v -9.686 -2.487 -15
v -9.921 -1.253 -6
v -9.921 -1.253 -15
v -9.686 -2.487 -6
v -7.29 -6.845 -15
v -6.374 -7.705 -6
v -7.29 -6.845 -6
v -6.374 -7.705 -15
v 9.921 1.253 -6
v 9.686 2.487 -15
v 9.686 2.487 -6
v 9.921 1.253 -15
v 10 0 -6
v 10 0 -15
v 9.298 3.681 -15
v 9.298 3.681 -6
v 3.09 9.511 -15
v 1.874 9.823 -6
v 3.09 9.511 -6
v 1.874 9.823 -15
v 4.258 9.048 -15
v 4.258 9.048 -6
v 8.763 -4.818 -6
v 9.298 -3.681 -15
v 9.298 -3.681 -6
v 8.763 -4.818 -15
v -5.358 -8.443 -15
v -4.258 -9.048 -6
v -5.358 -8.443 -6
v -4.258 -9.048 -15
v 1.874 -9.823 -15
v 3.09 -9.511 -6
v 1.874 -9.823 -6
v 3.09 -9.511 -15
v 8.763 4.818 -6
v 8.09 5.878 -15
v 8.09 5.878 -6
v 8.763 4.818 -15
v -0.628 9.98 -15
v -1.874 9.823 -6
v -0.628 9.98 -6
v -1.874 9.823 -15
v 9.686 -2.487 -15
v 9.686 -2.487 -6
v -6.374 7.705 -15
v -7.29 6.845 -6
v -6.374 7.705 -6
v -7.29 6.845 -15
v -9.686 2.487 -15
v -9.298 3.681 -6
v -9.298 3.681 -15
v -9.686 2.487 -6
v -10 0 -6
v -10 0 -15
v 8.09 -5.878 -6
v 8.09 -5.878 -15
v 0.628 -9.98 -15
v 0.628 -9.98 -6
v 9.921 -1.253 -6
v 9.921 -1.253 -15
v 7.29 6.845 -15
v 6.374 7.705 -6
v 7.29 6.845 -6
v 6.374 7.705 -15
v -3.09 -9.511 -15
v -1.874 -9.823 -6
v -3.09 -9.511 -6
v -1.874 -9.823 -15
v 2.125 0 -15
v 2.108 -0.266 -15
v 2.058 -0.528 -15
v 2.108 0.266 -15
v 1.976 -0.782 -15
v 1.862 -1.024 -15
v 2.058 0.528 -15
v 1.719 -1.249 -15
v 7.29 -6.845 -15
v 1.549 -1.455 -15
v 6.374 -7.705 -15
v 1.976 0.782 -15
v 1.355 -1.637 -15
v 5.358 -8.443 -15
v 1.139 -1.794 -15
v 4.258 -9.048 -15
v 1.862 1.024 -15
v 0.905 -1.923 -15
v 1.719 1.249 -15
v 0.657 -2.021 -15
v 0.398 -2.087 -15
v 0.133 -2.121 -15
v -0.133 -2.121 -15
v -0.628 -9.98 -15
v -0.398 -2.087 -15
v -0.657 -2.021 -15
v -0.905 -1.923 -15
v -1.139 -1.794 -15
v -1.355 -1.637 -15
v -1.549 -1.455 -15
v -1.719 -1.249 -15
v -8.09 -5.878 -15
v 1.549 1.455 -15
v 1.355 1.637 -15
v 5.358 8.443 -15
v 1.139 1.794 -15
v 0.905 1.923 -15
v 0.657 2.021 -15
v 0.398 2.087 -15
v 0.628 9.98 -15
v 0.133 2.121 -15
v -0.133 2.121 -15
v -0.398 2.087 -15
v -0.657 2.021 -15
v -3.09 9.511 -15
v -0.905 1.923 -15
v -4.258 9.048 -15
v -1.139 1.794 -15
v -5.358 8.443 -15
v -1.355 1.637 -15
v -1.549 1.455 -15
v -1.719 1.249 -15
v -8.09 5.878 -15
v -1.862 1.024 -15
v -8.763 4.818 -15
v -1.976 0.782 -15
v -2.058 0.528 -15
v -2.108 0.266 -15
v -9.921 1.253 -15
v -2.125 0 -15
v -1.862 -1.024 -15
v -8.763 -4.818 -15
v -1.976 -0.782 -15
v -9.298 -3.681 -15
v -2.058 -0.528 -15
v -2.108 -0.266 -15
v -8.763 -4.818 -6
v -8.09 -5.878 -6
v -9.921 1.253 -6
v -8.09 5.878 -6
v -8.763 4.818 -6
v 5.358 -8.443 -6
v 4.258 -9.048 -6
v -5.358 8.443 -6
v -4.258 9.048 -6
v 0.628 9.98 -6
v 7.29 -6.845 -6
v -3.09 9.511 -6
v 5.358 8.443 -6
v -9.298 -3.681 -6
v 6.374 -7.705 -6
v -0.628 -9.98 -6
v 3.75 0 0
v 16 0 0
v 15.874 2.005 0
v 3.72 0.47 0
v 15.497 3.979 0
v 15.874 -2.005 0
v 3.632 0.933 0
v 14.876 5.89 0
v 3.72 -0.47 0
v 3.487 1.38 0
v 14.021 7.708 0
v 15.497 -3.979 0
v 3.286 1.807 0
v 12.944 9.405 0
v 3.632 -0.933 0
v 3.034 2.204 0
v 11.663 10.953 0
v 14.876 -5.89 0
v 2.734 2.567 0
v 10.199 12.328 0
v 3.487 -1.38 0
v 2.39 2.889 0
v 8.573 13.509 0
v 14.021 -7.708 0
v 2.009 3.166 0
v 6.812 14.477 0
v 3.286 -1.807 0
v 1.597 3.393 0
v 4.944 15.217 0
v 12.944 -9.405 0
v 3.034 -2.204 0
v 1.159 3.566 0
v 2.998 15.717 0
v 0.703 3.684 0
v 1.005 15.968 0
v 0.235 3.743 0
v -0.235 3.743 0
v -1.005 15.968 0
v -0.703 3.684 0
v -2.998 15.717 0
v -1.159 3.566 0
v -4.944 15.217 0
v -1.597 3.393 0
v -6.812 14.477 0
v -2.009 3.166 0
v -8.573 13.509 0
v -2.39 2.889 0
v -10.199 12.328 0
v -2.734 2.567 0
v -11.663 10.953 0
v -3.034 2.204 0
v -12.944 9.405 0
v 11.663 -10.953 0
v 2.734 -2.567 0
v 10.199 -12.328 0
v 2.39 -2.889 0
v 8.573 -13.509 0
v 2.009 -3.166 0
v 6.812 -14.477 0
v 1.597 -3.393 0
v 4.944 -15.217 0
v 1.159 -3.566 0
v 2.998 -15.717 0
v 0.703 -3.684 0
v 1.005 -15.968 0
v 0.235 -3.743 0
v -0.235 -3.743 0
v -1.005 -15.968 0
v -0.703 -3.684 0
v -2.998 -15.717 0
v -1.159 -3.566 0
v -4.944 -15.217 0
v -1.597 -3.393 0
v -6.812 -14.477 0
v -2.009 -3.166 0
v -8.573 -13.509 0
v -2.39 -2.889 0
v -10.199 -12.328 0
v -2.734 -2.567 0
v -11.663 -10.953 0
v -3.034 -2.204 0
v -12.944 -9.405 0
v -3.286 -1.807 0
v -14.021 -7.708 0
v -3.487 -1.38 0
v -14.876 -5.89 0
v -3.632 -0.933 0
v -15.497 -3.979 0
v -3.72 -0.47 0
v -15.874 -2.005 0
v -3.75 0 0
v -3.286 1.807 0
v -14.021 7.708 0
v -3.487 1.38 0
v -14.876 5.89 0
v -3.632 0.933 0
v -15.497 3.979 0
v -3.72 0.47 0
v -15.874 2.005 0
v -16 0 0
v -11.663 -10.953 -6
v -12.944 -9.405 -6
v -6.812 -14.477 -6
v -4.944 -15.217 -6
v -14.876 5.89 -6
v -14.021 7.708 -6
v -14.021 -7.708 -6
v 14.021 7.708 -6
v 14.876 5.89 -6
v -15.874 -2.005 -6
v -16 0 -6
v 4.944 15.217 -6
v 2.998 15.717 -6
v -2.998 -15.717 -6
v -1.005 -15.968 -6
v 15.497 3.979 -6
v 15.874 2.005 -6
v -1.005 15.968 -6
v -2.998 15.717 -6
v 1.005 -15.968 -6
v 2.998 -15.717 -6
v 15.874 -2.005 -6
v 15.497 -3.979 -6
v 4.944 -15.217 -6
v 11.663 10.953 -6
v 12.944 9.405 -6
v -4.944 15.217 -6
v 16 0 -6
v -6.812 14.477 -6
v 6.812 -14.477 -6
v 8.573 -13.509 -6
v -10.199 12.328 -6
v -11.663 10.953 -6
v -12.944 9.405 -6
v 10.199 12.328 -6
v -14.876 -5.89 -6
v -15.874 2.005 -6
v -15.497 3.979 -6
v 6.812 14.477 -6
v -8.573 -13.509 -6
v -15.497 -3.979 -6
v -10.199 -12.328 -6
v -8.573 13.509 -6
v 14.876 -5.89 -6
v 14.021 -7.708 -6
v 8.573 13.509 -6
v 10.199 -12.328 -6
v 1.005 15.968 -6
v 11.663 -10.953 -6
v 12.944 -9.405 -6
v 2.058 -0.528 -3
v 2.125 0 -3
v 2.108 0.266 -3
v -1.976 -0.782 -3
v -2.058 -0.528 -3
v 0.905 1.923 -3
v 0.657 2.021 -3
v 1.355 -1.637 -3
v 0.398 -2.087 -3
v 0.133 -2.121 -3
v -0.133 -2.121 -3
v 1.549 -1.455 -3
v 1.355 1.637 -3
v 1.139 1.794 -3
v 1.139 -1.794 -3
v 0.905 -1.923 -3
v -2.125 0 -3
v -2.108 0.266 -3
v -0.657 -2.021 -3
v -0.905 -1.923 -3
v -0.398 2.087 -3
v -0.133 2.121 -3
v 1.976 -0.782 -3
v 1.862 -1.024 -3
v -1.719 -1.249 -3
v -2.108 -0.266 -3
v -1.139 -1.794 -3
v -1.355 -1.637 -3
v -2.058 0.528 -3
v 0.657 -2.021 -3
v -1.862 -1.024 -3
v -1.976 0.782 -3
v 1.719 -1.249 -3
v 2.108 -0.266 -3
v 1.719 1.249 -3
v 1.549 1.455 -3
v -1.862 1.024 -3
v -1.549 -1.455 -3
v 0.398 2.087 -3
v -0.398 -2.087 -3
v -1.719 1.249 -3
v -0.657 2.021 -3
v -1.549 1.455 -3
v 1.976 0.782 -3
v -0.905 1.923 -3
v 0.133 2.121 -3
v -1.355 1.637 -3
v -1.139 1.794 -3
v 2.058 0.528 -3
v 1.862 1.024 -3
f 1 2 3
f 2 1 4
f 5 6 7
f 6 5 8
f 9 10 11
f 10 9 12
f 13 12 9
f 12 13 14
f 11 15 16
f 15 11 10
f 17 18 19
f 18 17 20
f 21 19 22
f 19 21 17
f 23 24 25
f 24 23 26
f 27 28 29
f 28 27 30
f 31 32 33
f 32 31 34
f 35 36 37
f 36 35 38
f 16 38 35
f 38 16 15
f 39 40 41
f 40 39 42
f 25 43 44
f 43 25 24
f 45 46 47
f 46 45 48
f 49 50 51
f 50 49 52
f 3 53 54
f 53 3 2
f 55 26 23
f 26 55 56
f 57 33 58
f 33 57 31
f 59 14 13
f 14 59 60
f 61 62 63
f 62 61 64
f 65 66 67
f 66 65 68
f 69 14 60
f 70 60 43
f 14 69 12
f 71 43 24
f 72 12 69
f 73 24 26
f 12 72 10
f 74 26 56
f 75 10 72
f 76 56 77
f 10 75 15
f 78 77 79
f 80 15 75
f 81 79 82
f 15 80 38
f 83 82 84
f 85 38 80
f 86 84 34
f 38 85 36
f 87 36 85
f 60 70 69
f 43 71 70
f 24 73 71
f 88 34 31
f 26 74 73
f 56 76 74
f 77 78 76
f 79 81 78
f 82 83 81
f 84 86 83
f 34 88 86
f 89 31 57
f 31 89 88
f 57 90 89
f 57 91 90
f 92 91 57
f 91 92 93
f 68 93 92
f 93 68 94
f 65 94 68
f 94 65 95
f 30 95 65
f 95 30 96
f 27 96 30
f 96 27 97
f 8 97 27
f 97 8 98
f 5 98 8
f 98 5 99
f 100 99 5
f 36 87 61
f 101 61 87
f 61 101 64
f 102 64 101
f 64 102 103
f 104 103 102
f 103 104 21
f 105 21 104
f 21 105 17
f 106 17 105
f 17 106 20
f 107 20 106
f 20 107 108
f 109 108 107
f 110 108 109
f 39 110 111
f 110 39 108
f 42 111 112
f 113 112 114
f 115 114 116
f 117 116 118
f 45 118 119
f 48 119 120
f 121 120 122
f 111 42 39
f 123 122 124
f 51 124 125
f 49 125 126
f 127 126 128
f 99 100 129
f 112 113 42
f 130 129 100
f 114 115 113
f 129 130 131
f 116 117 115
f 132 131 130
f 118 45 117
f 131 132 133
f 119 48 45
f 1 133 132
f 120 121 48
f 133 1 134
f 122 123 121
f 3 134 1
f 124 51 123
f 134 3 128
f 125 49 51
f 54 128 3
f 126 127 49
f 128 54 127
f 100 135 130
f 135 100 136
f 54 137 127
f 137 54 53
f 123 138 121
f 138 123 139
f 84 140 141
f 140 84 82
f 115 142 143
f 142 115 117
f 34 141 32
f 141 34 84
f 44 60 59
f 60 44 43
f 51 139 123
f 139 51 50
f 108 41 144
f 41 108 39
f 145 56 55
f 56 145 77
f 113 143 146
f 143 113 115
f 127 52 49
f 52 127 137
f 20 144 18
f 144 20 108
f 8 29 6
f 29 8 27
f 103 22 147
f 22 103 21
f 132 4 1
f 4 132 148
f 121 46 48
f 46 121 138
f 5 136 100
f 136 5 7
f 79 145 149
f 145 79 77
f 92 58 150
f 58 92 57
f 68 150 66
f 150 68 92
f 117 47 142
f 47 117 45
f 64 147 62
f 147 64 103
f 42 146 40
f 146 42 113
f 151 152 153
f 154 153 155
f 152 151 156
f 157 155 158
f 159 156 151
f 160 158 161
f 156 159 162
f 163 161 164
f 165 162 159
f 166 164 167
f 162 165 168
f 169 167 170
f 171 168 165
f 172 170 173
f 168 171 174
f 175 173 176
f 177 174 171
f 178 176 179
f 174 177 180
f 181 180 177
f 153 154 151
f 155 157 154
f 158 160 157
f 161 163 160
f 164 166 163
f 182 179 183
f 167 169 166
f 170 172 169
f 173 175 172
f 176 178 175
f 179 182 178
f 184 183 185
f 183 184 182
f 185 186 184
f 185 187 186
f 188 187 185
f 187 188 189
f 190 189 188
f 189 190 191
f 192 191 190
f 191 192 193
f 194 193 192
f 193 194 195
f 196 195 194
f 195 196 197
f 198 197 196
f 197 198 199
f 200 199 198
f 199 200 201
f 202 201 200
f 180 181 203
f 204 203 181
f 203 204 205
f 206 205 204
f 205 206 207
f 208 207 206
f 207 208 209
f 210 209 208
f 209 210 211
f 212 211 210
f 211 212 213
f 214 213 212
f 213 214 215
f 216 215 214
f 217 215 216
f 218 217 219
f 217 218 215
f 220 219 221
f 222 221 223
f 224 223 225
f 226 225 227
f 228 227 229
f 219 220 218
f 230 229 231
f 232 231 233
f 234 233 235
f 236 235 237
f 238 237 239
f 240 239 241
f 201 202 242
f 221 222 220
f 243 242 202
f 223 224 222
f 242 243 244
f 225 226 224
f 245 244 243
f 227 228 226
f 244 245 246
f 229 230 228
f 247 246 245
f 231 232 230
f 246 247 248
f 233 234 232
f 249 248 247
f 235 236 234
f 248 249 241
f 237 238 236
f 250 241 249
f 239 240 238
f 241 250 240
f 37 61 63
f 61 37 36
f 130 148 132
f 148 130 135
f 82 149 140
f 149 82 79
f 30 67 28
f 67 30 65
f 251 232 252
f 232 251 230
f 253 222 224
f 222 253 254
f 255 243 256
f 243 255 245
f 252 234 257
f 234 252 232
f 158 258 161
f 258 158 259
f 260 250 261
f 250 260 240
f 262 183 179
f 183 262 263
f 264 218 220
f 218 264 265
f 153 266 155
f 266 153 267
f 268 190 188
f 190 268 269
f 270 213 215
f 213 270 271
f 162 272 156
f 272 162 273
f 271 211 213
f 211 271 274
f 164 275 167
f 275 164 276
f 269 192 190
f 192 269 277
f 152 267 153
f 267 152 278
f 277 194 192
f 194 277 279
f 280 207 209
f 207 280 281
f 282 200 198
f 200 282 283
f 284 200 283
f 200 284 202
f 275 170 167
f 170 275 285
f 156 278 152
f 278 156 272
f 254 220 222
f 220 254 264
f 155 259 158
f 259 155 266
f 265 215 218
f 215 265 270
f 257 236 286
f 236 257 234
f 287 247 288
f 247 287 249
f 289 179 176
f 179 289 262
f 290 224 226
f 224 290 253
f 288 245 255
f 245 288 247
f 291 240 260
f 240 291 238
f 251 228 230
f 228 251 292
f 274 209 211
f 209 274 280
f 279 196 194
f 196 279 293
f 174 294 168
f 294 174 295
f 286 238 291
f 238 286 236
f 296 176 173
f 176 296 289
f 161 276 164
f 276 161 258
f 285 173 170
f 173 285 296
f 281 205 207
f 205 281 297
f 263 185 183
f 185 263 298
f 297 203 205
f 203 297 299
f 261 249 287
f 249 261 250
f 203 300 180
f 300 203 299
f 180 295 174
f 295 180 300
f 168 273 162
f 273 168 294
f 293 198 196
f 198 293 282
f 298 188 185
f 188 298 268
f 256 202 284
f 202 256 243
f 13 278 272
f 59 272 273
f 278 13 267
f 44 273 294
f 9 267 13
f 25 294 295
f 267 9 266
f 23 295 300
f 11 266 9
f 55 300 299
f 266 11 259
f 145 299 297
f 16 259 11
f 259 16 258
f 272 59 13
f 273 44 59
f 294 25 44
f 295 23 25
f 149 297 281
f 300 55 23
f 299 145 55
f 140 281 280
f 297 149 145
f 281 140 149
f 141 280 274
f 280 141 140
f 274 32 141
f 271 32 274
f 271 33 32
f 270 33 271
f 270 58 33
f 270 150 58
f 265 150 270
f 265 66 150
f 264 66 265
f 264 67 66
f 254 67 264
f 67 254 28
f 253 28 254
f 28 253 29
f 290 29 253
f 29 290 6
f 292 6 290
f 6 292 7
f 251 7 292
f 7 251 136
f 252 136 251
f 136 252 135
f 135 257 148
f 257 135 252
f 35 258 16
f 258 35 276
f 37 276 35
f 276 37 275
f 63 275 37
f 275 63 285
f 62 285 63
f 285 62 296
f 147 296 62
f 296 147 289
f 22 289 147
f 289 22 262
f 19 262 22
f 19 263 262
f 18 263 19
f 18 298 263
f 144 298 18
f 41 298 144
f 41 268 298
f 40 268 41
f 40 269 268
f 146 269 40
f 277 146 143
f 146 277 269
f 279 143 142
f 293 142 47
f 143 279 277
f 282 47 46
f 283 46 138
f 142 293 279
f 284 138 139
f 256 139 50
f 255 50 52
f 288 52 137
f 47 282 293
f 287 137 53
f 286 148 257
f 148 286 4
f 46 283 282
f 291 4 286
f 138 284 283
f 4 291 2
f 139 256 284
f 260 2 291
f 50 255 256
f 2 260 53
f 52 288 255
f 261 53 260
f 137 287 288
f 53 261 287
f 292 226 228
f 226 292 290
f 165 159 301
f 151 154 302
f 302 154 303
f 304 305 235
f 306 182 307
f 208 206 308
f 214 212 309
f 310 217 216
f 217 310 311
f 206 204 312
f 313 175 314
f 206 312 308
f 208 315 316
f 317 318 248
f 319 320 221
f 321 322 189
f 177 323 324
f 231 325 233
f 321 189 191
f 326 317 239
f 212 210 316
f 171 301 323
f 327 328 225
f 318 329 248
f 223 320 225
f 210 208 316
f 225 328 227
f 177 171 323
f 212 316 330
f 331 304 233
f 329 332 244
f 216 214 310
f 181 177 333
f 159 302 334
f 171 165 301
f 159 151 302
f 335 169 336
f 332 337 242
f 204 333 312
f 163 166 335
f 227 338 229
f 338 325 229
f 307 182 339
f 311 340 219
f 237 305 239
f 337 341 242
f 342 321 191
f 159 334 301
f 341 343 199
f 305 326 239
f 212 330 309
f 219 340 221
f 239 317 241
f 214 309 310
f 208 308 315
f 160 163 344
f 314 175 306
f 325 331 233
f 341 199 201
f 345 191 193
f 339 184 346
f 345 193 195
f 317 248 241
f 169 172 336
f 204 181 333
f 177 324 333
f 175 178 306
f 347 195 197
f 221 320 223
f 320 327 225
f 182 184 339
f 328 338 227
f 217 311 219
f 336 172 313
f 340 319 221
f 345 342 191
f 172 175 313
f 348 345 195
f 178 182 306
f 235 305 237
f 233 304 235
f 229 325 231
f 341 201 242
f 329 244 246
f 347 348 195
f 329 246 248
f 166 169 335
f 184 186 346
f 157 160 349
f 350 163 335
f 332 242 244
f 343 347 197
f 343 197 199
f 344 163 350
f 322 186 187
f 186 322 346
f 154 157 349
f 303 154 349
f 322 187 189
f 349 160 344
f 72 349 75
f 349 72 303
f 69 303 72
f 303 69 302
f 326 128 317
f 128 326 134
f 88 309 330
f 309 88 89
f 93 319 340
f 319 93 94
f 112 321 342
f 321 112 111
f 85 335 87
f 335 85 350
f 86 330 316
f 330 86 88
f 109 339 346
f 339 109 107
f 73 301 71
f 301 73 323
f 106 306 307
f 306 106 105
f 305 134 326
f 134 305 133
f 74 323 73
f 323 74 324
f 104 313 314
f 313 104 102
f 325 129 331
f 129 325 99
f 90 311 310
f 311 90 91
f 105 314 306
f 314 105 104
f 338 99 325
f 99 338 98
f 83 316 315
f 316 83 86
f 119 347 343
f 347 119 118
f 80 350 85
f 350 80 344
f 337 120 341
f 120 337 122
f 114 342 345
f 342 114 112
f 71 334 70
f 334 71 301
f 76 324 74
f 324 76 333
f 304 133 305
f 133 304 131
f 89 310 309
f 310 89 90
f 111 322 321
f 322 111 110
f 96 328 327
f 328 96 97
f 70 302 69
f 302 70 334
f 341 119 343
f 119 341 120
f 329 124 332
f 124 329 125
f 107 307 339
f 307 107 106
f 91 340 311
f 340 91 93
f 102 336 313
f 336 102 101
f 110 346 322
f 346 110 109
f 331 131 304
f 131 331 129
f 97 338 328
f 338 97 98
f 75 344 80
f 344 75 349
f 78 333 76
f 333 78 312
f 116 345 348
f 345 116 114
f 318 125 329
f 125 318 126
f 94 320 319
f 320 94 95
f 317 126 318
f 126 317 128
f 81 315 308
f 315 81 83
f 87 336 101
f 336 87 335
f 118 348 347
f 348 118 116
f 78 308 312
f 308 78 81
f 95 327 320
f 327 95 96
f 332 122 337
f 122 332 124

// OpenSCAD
$fn = 50;


difference() {
	union() {
		translate(v = [0, 0, -15.0000000000]) {
			cylinder(h = 15, r = 10.0000000000);
		}
		translate(v = [0, 0, -6.0000000000]) {
			cylinder(h = 6, r = 16.0000000000);
		}
	}
	union() {
		translate(v = [0, 0, 0]) {
			rotate(a = [0, 0, 0]) {
				difference() {
					union() {
						#translate(v = [0, 0, -15.0000000000]) {
							cylinder(h = 15, r = 2.0000000000);
						}
						#translate(v = [0, 0, -3]) {
							cylinder(h = 3, r = 10.0000000000, r1 = 2.1250000000, r2 = 3.7500000000);
						}
						#translate(v = [0, 0, -15.0000000000]) {
							cylinder(h = 15, r = 2.1250000000);
						}
						#translate(v = [0, 0, -15.0000000000]) {
							cylinder(h = 15, r = 2.0000000000);
						}
					}
					union();
				}
			}
		}
	}
}
